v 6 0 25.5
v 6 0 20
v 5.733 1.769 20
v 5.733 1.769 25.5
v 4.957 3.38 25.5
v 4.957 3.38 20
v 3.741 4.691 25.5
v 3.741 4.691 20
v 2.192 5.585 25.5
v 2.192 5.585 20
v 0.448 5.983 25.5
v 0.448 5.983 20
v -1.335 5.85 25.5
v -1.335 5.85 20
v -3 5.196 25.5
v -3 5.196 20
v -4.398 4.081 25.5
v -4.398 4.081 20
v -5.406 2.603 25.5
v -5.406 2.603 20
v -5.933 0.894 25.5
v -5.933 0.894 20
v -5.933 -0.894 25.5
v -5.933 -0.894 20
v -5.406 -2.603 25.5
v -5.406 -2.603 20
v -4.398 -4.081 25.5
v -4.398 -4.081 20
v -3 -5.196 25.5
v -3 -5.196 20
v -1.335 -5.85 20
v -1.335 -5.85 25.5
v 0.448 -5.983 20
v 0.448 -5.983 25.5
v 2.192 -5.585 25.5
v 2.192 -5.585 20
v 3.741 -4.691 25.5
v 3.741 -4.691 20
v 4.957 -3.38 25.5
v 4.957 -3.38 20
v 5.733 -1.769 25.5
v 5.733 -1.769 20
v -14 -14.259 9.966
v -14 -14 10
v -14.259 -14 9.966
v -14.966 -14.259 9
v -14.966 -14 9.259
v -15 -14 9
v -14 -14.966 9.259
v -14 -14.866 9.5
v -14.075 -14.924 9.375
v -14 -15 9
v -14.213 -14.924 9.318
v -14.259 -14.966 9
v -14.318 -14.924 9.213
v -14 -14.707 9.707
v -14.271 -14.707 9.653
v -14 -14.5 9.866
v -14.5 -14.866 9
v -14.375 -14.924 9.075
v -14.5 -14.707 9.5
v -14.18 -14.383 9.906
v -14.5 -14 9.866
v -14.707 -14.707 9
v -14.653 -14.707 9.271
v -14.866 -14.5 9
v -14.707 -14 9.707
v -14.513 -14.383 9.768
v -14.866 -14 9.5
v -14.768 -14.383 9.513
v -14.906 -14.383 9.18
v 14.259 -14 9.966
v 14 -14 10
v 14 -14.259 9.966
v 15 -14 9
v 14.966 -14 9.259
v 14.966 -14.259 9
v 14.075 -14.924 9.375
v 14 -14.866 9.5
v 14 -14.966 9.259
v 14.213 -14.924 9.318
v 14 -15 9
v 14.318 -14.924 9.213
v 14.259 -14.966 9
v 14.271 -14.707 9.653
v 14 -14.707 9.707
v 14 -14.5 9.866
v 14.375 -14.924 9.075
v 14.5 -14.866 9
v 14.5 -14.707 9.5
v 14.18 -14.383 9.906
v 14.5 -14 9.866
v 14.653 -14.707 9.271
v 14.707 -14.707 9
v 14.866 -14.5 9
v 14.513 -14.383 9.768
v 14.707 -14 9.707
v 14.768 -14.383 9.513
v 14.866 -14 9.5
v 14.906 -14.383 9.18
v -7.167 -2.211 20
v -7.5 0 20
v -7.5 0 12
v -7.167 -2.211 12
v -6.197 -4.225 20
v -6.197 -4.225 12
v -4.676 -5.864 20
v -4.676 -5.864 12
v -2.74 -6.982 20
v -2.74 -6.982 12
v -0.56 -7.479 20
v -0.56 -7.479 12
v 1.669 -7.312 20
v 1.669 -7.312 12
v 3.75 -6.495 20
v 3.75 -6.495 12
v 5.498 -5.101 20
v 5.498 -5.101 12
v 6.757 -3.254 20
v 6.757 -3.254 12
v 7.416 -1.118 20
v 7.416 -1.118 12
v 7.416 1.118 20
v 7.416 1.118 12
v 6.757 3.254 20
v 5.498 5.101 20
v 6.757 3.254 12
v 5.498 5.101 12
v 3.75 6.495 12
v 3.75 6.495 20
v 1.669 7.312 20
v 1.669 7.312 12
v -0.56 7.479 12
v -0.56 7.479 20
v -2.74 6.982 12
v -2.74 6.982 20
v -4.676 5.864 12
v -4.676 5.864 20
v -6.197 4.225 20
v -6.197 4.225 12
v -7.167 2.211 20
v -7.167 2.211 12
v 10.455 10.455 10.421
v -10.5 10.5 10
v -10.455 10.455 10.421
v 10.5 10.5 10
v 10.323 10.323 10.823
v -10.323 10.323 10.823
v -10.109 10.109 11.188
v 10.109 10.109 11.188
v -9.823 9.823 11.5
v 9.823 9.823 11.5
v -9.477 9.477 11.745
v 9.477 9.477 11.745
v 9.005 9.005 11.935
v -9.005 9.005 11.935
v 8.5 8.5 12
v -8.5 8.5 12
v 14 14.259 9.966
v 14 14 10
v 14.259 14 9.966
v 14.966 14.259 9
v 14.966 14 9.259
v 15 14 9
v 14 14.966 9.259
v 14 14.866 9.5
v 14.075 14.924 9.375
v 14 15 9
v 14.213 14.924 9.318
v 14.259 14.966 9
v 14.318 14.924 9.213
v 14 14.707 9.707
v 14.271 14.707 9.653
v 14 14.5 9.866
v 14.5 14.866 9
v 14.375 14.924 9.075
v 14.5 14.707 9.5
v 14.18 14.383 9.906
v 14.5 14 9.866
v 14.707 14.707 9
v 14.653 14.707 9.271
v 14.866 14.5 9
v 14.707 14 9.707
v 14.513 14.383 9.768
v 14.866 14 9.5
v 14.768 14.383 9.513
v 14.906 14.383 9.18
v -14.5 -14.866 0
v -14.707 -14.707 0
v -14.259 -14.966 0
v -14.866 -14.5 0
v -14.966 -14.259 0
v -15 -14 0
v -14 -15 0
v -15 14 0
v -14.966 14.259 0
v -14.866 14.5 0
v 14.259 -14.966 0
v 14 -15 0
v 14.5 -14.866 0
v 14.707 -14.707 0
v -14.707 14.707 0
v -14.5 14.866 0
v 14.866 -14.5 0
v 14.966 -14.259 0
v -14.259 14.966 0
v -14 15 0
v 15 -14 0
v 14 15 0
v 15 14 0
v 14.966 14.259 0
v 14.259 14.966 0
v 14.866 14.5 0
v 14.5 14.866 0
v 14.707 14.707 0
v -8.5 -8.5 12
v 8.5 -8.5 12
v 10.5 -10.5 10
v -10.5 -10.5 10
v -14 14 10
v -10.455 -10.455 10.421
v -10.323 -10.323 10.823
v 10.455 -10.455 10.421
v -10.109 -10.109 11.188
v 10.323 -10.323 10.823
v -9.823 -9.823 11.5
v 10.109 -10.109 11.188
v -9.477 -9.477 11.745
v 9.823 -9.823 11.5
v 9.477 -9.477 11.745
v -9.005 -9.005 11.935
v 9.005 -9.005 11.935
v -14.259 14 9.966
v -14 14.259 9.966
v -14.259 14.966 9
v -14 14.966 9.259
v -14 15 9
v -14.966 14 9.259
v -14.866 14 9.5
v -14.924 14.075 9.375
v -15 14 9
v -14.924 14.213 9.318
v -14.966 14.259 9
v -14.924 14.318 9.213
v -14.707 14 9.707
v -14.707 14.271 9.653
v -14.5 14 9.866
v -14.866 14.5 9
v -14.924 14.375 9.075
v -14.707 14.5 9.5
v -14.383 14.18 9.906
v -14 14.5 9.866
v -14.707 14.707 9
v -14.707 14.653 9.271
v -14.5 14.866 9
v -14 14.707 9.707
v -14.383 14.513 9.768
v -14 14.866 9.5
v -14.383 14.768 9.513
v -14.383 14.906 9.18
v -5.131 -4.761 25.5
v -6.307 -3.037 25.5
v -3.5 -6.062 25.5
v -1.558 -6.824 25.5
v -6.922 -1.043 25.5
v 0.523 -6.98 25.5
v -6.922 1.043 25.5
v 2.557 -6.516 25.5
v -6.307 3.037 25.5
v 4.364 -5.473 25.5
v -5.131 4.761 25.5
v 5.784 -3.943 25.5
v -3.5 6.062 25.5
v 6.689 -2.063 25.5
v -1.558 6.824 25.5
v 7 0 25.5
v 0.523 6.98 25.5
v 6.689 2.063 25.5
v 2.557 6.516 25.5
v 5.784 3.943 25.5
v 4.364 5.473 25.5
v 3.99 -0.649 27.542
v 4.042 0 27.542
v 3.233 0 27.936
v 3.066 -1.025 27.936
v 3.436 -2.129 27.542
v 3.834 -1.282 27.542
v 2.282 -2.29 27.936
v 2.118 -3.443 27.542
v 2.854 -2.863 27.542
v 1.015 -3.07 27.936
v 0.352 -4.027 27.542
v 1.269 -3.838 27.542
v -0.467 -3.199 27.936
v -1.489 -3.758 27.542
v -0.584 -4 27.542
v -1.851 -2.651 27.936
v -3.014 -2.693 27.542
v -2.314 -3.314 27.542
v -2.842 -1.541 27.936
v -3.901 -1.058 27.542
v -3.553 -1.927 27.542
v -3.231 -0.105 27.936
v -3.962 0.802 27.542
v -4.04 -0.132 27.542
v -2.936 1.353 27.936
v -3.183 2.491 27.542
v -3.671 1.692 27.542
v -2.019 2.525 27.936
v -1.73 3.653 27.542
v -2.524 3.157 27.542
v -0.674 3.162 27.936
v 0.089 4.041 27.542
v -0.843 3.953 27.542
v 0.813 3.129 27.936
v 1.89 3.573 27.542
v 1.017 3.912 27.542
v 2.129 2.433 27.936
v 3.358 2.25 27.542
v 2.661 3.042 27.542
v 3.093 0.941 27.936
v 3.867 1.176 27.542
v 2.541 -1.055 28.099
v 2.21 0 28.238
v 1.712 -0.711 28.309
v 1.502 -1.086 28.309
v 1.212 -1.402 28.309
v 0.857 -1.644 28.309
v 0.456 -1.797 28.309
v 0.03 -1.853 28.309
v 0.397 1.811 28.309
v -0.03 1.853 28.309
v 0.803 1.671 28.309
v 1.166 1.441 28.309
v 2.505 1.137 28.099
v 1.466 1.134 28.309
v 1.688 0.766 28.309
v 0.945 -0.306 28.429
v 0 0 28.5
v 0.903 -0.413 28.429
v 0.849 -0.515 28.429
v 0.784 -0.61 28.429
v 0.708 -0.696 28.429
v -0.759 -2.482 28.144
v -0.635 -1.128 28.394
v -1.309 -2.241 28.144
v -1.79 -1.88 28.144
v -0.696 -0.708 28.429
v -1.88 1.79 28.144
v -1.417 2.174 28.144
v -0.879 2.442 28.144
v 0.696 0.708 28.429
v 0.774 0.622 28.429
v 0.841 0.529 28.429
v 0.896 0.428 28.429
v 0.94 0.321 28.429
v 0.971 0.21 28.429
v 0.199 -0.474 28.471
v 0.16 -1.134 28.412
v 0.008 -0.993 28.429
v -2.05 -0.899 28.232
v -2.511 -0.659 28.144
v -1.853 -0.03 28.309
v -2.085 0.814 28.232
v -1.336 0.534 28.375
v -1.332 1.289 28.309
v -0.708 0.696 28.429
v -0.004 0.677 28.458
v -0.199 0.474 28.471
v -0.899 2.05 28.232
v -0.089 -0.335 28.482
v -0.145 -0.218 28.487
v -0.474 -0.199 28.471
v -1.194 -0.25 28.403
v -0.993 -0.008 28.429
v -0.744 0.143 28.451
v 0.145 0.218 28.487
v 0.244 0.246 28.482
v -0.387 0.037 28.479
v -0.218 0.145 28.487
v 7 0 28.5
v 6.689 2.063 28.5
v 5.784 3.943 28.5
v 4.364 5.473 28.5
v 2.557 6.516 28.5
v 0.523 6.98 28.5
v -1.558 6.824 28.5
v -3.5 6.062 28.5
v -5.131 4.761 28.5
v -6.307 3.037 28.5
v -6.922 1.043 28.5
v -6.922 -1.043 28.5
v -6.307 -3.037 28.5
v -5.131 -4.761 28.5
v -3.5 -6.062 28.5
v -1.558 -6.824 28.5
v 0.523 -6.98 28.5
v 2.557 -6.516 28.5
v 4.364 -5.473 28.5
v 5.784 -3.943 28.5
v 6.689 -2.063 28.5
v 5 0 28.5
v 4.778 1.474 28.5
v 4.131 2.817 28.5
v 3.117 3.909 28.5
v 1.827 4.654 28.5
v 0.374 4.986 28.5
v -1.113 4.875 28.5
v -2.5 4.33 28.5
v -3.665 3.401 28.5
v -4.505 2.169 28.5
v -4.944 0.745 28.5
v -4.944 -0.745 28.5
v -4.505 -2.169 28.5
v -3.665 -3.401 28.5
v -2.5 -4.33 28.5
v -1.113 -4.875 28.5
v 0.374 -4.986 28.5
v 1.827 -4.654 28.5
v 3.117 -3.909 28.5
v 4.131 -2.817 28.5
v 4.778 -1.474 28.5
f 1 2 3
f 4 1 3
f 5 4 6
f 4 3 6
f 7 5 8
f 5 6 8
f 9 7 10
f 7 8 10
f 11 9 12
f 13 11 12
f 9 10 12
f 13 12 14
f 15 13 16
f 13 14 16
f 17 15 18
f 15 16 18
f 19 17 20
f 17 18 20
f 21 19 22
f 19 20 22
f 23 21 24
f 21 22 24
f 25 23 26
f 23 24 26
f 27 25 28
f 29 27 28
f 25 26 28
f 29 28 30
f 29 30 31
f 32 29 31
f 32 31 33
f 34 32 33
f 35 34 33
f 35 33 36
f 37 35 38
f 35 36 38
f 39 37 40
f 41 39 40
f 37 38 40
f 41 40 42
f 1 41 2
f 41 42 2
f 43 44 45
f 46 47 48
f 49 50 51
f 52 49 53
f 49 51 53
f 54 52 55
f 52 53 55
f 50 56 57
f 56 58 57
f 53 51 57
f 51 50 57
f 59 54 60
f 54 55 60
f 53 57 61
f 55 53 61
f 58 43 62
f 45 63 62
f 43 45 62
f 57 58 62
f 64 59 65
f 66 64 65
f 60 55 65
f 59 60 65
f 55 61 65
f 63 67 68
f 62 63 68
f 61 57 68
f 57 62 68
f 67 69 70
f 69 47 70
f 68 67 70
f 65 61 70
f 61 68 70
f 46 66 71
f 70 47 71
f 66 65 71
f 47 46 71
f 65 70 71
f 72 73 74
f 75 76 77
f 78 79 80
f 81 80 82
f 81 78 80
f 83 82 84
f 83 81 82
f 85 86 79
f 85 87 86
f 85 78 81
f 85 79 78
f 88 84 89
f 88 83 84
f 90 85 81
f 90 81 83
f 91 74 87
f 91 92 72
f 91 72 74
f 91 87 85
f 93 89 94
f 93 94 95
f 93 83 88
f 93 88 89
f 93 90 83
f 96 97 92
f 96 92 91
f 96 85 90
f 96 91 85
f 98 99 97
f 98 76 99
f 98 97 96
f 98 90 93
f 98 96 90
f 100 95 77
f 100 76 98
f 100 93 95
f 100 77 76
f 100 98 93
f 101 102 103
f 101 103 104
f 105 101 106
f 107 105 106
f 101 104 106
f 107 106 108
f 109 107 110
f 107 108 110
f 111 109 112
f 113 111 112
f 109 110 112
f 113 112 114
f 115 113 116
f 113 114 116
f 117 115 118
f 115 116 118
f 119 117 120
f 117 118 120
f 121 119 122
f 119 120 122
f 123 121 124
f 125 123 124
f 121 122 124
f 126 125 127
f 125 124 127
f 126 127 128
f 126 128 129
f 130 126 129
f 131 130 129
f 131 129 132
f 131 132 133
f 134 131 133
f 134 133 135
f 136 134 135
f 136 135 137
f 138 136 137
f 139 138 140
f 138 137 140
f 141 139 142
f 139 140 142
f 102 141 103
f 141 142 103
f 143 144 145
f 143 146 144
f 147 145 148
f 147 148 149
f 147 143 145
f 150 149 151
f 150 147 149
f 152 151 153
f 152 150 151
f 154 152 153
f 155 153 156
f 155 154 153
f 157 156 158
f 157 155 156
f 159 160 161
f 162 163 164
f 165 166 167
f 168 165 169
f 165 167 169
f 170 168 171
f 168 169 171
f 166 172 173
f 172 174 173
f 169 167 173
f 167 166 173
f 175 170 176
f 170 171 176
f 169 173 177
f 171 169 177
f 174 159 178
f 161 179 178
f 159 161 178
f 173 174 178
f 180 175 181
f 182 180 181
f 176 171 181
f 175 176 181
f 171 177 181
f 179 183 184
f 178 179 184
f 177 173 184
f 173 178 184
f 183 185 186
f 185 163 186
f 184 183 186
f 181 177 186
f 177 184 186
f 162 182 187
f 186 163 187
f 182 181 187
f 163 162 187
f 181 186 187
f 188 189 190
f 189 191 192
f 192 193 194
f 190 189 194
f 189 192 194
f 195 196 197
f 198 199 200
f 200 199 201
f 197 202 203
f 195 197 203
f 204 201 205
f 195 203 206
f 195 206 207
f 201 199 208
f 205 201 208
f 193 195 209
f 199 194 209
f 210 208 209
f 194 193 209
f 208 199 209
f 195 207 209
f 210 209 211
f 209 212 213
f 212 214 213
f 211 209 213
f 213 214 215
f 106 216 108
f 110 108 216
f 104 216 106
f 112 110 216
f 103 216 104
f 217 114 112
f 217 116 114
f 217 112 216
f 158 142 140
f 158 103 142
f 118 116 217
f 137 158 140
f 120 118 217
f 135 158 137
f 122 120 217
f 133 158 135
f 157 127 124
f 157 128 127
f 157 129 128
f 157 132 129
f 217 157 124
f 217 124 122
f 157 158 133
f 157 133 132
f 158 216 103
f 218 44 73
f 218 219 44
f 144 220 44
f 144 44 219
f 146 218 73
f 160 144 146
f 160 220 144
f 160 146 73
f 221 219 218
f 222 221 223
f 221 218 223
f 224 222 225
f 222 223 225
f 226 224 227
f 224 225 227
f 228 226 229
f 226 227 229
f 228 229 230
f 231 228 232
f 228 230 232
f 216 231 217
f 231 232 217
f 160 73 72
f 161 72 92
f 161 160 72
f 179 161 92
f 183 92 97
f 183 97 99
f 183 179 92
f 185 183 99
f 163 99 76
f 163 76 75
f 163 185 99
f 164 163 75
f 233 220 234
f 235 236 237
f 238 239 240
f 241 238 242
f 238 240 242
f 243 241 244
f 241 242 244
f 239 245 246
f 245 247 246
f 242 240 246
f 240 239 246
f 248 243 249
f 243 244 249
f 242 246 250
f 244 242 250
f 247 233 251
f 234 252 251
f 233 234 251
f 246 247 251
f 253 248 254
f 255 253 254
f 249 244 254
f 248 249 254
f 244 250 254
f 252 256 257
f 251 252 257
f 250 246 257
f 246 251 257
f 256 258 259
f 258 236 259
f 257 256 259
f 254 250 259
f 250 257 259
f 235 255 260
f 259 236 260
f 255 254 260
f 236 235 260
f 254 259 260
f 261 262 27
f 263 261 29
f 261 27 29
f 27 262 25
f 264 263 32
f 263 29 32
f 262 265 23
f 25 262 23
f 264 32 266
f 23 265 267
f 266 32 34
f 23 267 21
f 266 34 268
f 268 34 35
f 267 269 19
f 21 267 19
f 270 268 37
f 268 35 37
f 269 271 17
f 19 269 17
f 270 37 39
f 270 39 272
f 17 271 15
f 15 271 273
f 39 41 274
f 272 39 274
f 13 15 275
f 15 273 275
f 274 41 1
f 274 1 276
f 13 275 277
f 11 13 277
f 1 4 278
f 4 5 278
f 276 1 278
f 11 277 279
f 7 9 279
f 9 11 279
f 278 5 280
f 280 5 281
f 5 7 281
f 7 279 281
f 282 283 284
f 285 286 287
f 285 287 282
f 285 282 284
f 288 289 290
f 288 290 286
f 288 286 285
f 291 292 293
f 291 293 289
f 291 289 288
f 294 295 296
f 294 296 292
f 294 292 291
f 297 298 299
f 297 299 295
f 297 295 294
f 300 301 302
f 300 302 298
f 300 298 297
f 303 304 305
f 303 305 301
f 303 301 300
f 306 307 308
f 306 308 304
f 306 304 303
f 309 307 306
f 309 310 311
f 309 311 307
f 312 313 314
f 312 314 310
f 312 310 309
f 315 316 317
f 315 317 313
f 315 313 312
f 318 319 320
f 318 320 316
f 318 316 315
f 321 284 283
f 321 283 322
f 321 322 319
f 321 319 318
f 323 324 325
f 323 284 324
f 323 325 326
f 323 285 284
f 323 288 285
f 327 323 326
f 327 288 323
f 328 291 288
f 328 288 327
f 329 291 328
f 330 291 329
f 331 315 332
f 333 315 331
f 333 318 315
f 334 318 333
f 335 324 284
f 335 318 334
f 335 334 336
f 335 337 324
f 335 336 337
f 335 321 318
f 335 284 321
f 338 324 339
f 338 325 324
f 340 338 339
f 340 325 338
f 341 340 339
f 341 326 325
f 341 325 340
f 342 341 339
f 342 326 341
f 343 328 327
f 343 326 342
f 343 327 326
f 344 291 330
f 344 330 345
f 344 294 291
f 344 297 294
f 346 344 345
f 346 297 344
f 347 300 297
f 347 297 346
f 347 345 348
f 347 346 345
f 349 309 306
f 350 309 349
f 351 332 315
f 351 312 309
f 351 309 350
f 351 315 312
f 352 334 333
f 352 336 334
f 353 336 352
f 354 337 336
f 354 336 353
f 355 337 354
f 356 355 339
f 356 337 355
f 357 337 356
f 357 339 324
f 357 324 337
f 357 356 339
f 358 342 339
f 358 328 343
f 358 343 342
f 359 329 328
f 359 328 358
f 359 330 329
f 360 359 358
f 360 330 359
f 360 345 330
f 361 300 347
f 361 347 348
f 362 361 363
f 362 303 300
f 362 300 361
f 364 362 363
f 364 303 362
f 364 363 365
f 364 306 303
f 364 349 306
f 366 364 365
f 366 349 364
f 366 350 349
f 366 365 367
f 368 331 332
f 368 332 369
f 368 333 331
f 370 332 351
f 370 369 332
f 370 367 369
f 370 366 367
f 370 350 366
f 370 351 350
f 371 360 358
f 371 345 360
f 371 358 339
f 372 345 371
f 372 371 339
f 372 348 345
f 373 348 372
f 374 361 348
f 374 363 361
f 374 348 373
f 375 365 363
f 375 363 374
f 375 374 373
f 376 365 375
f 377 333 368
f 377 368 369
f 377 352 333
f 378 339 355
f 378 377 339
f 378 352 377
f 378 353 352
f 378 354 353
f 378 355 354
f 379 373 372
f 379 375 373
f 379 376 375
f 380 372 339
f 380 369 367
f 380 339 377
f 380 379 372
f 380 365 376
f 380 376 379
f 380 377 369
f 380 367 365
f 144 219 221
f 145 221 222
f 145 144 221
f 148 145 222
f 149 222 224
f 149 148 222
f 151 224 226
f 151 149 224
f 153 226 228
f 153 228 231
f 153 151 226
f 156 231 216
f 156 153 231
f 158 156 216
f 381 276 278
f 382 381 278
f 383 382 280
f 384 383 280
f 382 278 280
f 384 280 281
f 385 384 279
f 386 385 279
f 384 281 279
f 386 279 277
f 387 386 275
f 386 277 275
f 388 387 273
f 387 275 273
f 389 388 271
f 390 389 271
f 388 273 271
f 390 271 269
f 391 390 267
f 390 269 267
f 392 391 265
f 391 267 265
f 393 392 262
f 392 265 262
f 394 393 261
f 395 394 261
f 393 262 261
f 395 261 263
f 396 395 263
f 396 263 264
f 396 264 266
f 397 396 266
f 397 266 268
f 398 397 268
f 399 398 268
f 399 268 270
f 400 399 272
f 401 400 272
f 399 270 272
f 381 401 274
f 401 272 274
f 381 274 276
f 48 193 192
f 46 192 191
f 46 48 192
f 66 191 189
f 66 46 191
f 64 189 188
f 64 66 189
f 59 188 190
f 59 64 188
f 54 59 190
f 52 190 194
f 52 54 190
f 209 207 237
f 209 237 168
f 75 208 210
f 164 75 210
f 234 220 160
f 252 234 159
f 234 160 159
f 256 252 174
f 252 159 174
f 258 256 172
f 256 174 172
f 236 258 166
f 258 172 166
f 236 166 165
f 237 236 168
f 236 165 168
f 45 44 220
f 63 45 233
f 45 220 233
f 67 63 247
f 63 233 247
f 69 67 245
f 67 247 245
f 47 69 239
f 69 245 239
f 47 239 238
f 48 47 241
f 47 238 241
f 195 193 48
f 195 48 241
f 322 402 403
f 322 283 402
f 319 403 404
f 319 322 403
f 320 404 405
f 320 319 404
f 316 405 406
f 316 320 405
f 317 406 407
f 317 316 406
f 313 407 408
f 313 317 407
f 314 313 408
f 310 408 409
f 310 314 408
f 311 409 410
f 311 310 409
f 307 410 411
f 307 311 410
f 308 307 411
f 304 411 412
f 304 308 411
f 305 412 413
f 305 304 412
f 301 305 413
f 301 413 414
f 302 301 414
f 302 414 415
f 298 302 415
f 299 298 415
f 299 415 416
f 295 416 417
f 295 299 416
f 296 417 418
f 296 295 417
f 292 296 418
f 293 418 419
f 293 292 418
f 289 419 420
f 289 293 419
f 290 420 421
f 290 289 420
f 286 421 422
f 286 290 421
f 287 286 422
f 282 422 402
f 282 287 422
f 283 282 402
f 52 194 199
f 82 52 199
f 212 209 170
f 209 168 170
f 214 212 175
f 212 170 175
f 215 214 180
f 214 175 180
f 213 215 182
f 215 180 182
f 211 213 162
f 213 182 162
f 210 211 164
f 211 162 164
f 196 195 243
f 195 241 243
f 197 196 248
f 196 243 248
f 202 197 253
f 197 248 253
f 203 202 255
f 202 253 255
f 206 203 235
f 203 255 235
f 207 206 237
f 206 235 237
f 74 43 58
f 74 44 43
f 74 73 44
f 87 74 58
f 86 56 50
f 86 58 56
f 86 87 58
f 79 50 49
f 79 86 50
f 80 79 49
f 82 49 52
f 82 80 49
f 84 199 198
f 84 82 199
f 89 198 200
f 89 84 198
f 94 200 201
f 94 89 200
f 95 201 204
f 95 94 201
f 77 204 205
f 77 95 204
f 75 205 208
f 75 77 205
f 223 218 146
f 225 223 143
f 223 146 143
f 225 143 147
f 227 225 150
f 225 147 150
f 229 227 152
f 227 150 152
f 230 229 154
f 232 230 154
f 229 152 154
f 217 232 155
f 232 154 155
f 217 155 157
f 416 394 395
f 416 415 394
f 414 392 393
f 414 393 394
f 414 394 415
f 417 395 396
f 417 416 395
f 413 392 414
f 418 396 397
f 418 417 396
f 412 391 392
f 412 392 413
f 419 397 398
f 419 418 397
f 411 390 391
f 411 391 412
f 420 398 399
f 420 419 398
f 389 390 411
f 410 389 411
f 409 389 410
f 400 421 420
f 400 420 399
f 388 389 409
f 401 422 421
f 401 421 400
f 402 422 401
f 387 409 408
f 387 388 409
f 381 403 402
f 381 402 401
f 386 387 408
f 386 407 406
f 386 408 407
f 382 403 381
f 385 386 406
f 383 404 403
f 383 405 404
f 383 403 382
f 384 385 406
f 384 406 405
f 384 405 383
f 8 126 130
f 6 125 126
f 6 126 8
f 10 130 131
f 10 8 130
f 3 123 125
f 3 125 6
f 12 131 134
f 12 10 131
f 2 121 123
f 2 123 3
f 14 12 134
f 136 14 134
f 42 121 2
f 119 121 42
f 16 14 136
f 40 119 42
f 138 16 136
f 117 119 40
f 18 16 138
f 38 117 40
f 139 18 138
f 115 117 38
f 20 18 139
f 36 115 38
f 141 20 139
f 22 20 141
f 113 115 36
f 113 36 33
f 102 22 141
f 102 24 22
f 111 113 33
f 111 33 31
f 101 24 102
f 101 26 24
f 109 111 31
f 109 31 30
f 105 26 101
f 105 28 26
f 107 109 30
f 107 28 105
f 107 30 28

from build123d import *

# Parameters (mm, degrees)
SKETCH1_W          = 30
SKETCH1_H          = 30
EXTRUDE1_DEPTH     = 10
SKETCH2_W          = 21
SKETCH2_H          = 21
EXTRUDE2_DEPTH     = 2
SKETCH3_R          = 7.5
EXTRUDE3_DEPTH     = 8
SKETCH4_R          = 6
EXTRUDE4_DEPTH     = 5.5
SKETCH5_R          = 7
EXTRUDE5_DEPTH     = 3
SKETCH6_R          = 5
CUT_EXTRUDE1_DEPTH = 3
CHAMFER1_SIZE      = 3
FILLET1_R          = 1
FILLET2_R          = 2


with BuildPart() as part:
    # Sketch1 → Extrude1 (new body)
    with BuildSketch(Plane.XY):
        Rectangle(SKETCH1_W, SKETCH1_H)
    extrude(amount=EXTRUDE1_DEPTH)

    # Sketch2 → Extrude2 (add)
    with BuildSketch(Plane.XY.offset(10)):
        Rectangle(SKETCH2_W, SKETCH2_H)
    extrude(amount=EXTRUDE2_DEPTH)

    # Sketch3 → Extrude3 (add)
    with BuildSketch(Plane.XY.offset(12)):
        with Locations(Location((0, 0, 0), (0, 0, 180))):
            Circle(SKETCH3_R)
    extrude(amount=EXTRUDE3_DEPTH)

    # Sketch4 → Extrude4 (add)
    with BuildSketch(Plane.XY.offset(20)):
        Circle(SKETCH4_R)
    extrude(amount=EXTRUDE4_DEPTH)

    # Sketch5 → Extrude5 (add)
    with BuildSketch(Plane.XY.offset(25.5)):
        Circle(SKETCH5_R)
    extrude(amount=EXTRUDE5_DEPTH)

    # Sketch6 → Cut-Extrude1 (cut)
    with BuildSketch(Plane.XY.offset(28.5)):
        Circle(SKETCH6_R)
    extrude(amount=-CUT_EXTRUDE1_DEPTH, mode=Mode.SUBTRACT)

    # Chamfer1
    chamfer1_edges = [part.edges().sort_by_distance(p)[0] for p in [
        (-5, 0, 25.5),
    ]]
    chamfer(chamfer1_edges, length=CHAMFER1_SIZE - 0.0001)  # a hair under: the kernel refuses the full size

    # Sketch8 → Revolve1 (revolve)
    with BuildSketch(Plane(origin=(0, 0, 0), x_dir=(0, 0, -1), z_dir=(1, 0, 0)), mode=Mode.PRIVATE) as revolve1_sk:
        with BuildLine():
            Line((-25.5, 0), (-25.5, 6))
            add(Edge.make_bspline(
                [(-28.5, 0), (-28.329286333, 3.962436502), (-27.079878372, 4.87576544), (-25.5, 6)],
                knots=[0, 0, 0, 0, 1, 1, 1, 1], degree=3))
            Line((-28.5, 0), (-25.5, 0))
        make_face()
    revolve(revolve1_sk.sketch.rotate(Axis((0, 0, 28.5), (0, 0, -1)), 90), axis=Axis((0, 0, 28.5), (0, 0, -1)))

    # Fillet1
    fillet1_edges = [part.edges().sort_by_distance(p)[0] for p in [
        (15, 0, 10),
        (0, 15, 10),
        (-15, 0, 10),
        (0, -15, 10),
        (-15, 15, 5),
        (15, 15, 5),
        (15, -15, 5),
        (-15, -15, 5),
    ]]
    fillet(fillet1_edges, radius=FILLET1_R)

    # Fillet2
    fillet2_edges = [part.edges().sort_by_distance(p)[0] for p in [
        (0, -10.5, 12),
        (10.5, 0, 12),
        (0, 10.5, 12),
        (-10.5, 0, 12),
    ]]
    fillet(fillet2_edges, radius=FILLET2_R - 0.0001)  # a hair under: the kernel refuses the full size


solid = part.part
